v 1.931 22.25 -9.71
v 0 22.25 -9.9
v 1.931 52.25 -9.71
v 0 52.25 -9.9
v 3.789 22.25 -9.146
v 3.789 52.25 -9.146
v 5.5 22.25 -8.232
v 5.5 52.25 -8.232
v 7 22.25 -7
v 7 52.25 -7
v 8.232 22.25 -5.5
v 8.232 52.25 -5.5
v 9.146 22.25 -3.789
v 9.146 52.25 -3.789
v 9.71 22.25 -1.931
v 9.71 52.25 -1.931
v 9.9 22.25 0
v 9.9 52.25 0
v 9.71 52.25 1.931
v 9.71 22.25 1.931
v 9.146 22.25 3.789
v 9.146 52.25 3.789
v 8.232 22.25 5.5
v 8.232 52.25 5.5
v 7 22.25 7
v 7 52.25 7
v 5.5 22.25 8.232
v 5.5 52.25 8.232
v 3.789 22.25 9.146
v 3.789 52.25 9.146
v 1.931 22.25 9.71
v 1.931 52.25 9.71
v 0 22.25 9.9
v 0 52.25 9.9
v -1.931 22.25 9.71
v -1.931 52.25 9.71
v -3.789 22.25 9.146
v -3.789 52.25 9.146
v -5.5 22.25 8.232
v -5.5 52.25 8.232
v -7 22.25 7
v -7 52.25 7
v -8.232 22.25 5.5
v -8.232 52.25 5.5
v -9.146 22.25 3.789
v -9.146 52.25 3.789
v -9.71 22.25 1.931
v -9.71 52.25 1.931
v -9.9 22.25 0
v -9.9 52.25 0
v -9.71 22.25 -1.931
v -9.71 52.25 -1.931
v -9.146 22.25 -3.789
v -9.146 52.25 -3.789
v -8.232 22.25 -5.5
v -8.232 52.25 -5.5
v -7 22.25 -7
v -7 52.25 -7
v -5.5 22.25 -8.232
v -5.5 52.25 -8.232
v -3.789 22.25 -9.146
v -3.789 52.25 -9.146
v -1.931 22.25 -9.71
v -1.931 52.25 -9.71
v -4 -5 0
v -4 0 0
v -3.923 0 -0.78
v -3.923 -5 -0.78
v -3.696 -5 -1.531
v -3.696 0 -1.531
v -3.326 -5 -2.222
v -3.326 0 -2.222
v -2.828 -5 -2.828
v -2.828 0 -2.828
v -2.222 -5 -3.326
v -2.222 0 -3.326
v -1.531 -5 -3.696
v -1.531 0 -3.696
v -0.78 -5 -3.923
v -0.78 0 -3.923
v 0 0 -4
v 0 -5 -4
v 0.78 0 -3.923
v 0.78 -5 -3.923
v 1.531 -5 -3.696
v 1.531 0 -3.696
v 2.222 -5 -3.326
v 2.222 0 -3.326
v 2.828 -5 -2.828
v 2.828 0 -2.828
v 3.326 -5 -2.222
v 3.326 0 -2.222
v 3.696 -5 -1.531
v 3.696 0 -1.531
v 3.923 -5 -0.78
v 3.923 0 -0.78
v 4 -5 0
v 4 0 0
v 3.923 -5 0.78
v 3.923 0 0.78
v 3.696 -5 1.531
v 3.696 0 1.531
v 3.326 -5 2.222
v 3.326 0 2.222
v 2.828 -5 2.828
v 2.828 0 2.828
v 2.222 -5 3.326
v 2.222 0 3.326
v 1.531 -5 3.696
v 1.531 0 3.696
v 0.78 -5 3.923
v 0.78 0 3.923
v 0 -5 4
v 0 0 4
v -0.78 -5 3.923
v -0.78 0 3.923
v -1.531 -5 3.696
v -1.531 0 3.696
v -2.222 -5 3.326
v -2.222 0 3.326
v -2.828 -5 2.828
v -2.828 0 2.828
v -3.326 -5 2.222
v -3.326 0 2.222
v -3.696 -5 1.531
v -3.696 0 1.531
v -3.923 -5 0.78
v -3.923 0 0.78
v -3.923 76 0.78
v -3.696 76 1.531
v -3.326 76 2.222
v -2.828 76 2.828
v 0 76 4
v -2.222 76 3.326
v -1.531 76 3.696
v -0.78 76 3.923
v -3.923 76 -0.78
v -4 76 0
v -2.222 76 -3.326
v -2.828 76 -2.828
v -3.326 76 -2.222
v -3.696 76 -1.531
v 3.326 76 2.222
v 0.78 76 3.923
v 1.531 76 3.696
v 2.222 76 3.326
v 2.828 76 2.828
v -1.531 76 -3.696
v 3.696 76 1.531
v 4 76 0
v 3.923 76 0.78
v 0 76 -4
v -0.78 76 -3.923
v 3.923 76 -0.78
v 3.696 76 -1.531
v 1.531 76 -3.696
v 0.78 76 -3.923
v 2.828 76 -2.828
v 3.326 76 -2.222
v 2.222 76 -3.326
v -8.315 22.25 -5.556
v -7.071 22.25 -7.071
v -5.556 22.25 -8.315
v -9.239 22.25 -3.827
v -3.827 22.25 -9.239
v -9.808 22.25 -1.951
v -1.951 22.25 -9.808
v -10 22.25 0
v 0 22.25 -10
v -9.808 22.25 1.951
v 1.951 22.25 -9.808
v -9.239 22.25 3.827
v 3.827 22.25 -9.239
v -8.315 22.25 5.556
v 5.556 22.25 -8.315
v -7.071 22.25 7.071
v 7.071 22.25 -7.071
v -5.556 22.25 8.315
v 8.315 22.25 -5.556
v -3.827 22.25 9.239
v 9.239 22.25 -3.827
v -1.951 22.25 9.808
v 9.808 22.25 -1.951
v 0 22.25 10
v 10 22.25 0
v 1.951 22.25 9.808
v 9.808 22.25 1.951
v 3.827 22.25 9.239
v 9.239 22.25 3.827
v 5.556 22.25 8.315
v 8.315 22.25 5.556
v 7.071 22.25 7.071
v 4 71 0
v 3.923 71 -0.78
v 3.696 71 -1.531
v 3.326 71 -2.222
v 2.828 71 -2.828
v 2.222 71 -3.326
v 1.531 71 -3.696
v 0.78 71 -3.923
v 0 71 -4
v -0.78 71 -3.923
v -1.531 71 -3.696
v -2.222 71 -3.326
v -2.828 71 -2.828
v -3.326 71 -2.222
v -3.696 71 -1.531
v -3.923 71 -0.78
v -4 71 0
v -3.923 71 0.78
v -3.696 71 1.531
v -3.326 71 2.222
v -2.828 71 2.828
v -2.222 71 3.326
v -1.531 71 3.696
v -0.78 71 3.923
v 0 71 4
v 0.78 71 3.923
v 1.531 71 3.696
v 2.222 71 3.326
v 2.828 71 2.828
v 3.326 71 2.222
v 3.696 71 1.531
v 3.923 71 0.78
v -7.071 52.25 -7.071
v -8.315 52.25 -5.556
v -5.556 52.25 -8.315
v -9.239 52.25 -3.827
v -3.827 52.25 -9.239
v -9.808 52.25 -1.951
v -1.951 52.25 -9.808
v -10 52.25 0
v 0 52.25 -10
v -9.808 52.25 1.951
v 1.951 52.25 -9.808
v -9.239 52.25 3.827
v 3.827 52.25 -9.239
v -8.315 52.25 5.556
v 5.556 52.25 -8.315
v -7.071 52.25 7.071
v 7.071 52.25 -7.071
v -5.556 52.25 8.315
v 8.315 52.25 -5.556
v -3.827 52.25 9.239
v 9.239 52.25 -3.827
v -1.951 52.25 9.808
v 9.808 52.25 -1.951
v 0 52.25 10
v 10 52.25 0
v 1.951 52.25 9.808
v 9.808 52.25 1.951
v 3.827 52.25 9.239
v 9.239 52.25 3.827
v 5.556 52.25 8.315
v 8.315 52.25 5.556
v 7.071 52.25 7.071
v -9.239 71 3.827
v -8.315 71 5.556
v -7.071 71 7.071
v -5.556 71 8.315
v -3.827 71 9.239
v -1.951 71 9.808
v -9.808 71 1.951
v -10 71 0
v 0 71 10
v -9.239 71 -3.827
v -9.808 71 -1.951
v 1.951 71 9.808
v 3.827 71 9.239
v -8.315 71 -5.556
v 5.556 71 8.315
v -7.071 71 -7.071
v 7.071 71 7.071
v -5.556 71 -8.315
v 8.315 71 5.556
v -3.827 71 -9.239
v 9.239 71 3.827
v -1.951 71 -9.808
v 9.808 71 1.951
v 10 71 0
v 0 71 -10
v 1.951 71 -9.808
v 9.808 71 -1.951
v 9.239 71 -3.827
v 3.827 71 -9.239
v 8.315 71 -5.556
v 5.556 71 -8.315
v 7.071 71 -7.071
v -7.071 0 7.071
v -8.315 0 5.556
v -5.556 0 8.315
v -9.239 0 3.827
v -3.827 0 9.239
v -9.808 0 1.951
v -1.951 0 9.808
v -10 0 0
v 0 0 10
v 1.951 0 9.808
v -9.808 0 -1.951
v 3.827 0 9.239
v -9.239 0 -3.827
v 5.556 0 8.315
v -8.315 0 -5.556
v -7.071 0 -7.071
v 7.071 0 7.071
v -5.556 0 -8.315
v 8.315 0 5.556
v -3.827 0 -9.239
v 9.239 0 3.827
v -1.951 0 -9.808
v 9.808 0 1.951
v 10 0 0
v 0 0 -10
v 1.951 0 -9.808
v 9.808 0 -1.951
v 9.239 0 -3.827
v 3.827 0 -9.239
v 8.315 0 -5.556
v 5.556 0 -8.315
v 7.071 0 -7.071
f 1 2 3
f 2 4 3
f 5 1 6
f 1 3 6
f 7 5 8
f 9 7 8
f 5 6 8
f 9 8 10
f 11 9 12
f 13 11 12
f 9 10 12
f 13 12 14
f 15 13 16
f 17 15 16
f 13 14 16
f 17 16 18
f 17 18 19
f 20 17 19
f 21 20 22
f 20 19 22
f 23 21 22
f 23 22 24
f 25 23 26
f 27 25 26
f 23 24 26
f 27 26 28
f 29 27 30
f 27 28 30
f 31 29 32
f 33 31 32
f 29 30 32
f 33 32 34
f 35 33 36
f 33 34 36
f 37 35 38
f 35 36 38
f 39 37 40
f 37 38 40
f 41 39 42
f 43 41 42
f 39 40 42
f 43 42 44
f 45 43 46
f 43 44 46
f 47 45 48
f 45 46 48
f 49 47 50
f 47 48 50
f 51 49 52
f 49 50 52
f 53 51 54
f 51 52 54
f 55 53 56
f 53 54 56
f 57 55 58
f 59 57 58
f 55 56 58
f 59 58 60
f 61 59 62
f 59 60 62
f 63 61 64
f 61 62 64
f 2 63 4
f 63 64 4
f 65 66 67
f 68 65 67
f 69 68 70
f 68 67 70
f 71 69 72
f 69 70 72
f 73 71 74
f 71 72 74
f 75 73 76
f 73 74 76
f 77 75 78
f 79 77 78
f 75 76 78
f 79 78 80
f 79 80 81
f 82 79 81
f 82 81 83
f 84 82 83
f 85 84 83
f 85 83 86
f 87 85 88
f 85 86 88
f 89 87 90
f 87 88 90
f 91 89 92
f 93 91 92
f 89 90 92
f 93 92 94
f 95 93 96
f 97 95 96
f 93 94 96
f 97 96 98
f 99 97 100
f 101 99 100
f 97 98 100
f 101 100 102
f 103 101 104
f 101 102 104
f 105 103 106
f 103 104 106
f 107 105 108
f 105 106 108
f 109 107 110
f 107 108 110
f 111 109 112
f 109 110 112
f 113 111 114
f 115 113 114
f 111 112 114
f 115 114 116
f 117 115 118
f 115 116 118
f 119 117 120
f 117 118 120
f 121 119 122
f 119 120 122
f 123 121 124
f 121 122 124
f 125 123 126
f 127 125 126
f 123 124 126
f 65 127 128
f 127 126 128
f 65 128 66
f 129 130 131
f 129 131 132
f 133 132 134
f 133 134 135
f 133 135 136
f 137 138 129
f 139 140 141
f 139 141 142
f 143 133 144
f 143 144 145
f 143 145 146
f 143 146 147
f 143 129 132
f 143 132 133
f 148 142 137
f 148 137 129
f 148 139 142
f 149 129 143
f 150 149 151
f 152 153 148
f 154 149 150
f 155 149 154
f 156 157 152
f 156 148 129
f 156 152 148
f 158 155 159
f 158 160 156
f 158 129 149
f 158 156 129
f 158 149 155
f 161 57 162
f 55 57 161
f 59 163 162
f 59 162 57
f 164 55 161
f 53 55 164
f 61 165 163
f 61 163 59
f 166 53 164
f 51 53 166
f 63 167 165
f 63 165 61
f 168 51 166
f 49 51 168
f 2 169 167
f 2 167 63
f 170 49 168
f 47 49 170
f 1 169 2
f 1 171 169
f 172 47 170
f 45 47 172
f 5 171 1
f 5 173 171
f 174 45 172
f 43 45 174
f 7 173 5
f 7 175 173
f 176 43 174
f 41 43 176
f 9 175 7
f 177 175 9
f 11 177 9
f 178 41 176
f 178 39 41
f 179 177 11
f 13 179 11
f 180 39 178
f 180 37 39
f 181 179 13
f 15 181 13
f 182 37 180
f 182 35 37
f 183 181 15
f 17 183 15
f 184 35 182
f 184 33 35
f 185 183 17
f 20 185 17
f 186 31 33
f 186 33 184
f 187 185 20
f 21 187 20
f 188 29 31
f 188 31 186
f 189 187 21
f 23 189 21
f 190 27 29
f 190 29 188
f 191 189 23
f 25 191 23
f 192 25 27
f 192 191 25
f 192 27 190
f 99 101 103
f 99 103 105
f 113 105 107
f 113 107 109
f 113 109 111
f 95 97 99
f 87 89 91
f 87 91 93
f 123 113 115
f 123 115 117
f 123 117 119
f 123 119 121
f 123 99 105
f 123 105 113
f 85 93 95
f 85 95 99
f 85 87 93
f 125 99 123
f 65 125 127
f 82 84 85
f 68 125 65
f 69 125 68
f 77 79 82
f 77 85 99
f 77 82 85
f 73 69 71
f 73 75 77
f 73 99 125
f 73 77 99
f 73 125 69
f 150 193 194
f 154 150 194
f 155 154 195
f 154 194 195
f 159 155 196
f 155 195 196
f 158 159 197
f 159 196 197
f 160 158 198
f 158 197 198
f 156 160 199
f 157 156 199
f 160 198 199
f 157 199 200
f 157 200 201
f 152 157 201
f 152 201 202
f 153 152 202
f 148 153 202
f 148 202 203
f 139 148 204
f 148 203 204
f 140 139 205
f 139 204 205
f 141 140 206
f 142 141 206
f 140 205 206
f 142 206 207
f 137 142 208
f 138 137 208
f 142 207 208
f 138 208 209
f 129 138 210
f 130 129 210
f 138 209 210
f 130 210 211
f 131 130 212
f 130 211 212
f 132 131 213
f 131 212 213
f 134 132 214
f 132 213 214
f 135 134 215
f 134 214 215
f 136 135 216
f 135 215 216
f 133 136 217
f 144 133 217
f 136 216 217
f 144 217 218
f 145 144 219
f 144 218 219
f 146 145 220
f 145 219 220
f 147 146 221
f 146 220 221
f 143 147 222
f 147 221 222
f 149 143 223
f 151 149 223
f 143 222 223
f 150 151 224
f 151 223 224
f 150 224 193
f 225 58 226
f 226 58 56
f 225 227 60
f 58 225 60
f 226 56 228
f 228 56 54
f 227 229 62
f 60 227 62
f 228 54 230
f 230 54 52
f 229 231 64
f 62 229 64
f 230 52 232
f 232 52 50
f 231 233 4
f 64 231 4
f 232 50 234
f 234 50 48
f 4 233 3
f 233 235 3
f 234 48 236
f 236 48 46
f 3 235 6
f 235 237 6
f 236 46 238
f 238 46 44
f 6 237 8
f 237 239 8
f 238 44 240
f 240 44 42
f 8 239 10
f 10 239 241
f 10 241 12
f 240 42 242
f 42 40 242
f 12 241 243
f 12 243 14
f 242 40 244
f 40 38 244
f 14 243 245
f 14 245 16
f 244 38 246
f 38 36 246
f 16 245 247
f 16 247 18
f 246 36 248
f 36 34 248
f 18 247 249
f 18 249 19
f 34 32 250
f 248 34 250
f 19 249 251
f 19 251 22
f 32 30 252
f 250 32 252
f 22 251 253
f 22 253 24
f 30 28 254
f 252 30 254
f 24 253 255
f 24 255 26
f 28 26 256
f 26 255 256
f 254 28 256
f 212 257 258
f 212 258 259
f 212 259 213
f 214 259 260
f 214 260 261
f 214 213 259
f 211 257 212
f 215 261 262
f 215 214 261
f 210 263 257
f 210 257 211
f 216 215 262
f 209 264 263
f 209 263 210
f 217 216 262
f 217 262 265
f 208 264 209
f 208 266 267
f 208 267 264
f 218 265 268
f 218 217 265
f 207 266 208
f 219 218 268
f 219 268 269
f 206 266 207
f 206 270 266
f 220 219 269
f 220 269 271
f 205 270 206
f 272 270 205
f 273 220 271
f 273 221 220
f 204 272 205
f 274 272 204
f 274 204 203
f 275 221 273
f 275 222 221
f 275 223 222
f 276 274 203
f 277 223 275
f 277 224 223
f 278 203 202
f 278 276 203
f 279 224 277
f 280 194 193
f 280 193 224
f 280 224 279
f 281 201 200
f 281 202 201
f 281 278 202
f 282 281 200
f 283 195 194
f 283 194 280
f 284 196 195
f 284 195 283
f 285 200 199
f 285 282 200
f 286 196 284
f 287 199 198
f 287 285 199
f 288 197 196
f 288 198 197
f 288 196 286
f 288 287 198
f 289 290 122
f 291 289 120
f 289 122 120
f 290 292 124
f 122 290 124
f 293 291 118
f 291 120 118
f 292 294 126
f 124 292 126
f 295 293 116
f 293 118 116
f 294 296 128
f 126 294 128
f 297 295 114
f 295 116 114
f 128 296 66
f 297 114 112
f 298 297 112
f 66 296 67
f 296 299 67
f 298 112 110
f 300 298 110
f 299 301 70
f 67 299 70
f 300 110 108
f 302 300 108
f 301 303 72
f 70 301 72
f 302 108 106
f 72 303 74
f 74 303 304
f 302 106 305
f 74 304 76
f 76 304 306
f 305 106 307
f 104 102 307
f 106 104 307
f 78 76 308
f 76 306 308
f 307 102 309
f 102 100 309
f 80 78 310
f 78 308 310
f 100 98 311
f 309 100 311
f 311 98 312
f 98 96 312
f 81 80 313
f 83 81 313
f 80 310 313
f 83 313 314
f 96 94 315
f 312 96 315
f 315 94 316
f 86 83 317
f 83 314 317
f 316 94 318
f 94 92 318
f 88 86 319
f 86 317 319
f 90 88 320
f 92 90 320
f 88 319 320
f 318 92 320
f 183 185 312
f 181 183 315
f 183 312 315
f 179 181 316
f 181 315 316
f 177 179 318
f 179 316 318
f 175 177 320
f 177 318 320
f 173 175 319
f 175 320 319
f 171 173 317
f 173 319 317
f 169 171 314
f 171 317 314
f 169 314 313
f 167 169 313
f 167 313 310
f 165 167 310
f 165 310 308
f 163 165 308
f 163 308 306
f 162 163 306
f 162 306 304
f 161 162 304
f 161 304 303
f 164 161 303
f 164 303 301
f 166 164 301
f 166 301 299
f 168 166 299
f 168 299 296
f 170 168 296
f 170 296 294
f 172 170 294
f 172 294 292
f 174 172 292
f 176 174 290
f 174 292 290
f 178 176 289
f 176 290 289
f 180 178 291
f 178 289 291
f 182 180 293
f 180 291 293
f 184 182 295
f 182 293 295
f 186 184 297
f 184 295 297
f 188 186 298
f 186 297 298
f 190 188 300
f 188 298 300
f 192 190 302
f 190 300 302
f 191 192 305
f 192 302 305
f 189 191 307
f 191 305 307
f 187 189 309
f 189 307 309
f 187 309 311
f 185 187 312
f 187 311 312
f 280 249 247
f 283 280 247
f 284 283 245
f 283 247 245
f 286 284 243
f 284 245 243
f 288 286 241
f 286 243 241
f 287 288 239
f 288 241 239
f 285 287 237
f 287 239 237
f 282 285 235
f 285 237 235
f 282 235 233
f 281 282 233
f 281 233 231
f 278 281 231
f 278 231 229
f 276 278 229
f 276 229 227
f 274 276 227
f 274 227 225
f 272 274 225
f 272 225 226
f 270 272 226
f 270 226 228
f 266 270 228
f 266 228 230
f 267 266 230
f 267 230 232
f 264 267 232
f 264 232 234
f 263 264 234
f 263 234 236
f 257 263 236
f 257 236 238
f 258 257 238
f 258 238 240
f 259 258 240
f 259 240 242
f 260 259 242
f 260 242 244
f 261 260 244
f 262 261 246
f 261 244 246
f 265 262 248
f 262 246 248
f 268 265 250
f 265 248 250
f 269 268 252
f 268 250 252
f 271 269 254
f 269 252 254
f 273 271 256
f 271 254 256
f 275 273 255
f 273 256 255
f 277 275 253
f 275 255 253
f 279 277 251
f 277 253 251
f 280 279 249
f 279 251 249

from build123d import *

# Parameters (mm, degrees)
CROQUIS1_R              = 10
SALIENTE_EXTRUIR1_DEPTH = 71
CROQUIS3_W              = 0.1
CROQUIS3_H              = 30
CROQUIS4_R              = 4
SALIENTE_EXTRUIR2_DEPTH = 5
CROQUIS5_R              = 4
SALIENTE_EXTRUIR3_DEPTH = 5


with BuildPart() as part:
    # Croquis1 → Saliente-Extruir1 (new body)
    with BuildSketch(Plane(origin=(0, 0, 0), x_dir=(1, 0, 0), z_dir=(0, 1, 0))):
        Circle(CROQUIS1_R)
    extrude(amount=SALIENTE_EXTRUIR1_DEPTH)

    # Croquis3 → Cortar-Revolución1 (revolve, cut)
    with BuildSketch(Plane(origin=(0, 0, 0), x_dir=(0, 0, -1), z_dir=(1, 0, 0))):
        with Locations((9.95, 37.25)):
            Rectangle(CROQUIS3_W, CROQUIS3_H)
    revolve(axis=Axis((0, 71, 0), (0, -1, 0)), mode=Mode.SUBTRACT)

    # Croquis4 → Saliente-Extruir2 (add)
    with BuildSketch(Plane(origin=(0, 0, 0), x_dir=(-1, 0, 0), z_dir=(0, -1, 0))):
        Circle(CROQUIS4_R)
    extrude(amount=SALIENTE_EXTRUIR2_DEPTH)

    # Croquis5 → Saliente-Extruir3 (add)
    with BuildSketch(Plane(origin=(0, 71, 0), x_dir=(1, 0, 0), z_dir=(0, 1, 0))):
        Circle(CROQUIS5_R)
    extrude(amount=SALIENTE_EXTRUIR3_DEPTH)


solid = part.part
